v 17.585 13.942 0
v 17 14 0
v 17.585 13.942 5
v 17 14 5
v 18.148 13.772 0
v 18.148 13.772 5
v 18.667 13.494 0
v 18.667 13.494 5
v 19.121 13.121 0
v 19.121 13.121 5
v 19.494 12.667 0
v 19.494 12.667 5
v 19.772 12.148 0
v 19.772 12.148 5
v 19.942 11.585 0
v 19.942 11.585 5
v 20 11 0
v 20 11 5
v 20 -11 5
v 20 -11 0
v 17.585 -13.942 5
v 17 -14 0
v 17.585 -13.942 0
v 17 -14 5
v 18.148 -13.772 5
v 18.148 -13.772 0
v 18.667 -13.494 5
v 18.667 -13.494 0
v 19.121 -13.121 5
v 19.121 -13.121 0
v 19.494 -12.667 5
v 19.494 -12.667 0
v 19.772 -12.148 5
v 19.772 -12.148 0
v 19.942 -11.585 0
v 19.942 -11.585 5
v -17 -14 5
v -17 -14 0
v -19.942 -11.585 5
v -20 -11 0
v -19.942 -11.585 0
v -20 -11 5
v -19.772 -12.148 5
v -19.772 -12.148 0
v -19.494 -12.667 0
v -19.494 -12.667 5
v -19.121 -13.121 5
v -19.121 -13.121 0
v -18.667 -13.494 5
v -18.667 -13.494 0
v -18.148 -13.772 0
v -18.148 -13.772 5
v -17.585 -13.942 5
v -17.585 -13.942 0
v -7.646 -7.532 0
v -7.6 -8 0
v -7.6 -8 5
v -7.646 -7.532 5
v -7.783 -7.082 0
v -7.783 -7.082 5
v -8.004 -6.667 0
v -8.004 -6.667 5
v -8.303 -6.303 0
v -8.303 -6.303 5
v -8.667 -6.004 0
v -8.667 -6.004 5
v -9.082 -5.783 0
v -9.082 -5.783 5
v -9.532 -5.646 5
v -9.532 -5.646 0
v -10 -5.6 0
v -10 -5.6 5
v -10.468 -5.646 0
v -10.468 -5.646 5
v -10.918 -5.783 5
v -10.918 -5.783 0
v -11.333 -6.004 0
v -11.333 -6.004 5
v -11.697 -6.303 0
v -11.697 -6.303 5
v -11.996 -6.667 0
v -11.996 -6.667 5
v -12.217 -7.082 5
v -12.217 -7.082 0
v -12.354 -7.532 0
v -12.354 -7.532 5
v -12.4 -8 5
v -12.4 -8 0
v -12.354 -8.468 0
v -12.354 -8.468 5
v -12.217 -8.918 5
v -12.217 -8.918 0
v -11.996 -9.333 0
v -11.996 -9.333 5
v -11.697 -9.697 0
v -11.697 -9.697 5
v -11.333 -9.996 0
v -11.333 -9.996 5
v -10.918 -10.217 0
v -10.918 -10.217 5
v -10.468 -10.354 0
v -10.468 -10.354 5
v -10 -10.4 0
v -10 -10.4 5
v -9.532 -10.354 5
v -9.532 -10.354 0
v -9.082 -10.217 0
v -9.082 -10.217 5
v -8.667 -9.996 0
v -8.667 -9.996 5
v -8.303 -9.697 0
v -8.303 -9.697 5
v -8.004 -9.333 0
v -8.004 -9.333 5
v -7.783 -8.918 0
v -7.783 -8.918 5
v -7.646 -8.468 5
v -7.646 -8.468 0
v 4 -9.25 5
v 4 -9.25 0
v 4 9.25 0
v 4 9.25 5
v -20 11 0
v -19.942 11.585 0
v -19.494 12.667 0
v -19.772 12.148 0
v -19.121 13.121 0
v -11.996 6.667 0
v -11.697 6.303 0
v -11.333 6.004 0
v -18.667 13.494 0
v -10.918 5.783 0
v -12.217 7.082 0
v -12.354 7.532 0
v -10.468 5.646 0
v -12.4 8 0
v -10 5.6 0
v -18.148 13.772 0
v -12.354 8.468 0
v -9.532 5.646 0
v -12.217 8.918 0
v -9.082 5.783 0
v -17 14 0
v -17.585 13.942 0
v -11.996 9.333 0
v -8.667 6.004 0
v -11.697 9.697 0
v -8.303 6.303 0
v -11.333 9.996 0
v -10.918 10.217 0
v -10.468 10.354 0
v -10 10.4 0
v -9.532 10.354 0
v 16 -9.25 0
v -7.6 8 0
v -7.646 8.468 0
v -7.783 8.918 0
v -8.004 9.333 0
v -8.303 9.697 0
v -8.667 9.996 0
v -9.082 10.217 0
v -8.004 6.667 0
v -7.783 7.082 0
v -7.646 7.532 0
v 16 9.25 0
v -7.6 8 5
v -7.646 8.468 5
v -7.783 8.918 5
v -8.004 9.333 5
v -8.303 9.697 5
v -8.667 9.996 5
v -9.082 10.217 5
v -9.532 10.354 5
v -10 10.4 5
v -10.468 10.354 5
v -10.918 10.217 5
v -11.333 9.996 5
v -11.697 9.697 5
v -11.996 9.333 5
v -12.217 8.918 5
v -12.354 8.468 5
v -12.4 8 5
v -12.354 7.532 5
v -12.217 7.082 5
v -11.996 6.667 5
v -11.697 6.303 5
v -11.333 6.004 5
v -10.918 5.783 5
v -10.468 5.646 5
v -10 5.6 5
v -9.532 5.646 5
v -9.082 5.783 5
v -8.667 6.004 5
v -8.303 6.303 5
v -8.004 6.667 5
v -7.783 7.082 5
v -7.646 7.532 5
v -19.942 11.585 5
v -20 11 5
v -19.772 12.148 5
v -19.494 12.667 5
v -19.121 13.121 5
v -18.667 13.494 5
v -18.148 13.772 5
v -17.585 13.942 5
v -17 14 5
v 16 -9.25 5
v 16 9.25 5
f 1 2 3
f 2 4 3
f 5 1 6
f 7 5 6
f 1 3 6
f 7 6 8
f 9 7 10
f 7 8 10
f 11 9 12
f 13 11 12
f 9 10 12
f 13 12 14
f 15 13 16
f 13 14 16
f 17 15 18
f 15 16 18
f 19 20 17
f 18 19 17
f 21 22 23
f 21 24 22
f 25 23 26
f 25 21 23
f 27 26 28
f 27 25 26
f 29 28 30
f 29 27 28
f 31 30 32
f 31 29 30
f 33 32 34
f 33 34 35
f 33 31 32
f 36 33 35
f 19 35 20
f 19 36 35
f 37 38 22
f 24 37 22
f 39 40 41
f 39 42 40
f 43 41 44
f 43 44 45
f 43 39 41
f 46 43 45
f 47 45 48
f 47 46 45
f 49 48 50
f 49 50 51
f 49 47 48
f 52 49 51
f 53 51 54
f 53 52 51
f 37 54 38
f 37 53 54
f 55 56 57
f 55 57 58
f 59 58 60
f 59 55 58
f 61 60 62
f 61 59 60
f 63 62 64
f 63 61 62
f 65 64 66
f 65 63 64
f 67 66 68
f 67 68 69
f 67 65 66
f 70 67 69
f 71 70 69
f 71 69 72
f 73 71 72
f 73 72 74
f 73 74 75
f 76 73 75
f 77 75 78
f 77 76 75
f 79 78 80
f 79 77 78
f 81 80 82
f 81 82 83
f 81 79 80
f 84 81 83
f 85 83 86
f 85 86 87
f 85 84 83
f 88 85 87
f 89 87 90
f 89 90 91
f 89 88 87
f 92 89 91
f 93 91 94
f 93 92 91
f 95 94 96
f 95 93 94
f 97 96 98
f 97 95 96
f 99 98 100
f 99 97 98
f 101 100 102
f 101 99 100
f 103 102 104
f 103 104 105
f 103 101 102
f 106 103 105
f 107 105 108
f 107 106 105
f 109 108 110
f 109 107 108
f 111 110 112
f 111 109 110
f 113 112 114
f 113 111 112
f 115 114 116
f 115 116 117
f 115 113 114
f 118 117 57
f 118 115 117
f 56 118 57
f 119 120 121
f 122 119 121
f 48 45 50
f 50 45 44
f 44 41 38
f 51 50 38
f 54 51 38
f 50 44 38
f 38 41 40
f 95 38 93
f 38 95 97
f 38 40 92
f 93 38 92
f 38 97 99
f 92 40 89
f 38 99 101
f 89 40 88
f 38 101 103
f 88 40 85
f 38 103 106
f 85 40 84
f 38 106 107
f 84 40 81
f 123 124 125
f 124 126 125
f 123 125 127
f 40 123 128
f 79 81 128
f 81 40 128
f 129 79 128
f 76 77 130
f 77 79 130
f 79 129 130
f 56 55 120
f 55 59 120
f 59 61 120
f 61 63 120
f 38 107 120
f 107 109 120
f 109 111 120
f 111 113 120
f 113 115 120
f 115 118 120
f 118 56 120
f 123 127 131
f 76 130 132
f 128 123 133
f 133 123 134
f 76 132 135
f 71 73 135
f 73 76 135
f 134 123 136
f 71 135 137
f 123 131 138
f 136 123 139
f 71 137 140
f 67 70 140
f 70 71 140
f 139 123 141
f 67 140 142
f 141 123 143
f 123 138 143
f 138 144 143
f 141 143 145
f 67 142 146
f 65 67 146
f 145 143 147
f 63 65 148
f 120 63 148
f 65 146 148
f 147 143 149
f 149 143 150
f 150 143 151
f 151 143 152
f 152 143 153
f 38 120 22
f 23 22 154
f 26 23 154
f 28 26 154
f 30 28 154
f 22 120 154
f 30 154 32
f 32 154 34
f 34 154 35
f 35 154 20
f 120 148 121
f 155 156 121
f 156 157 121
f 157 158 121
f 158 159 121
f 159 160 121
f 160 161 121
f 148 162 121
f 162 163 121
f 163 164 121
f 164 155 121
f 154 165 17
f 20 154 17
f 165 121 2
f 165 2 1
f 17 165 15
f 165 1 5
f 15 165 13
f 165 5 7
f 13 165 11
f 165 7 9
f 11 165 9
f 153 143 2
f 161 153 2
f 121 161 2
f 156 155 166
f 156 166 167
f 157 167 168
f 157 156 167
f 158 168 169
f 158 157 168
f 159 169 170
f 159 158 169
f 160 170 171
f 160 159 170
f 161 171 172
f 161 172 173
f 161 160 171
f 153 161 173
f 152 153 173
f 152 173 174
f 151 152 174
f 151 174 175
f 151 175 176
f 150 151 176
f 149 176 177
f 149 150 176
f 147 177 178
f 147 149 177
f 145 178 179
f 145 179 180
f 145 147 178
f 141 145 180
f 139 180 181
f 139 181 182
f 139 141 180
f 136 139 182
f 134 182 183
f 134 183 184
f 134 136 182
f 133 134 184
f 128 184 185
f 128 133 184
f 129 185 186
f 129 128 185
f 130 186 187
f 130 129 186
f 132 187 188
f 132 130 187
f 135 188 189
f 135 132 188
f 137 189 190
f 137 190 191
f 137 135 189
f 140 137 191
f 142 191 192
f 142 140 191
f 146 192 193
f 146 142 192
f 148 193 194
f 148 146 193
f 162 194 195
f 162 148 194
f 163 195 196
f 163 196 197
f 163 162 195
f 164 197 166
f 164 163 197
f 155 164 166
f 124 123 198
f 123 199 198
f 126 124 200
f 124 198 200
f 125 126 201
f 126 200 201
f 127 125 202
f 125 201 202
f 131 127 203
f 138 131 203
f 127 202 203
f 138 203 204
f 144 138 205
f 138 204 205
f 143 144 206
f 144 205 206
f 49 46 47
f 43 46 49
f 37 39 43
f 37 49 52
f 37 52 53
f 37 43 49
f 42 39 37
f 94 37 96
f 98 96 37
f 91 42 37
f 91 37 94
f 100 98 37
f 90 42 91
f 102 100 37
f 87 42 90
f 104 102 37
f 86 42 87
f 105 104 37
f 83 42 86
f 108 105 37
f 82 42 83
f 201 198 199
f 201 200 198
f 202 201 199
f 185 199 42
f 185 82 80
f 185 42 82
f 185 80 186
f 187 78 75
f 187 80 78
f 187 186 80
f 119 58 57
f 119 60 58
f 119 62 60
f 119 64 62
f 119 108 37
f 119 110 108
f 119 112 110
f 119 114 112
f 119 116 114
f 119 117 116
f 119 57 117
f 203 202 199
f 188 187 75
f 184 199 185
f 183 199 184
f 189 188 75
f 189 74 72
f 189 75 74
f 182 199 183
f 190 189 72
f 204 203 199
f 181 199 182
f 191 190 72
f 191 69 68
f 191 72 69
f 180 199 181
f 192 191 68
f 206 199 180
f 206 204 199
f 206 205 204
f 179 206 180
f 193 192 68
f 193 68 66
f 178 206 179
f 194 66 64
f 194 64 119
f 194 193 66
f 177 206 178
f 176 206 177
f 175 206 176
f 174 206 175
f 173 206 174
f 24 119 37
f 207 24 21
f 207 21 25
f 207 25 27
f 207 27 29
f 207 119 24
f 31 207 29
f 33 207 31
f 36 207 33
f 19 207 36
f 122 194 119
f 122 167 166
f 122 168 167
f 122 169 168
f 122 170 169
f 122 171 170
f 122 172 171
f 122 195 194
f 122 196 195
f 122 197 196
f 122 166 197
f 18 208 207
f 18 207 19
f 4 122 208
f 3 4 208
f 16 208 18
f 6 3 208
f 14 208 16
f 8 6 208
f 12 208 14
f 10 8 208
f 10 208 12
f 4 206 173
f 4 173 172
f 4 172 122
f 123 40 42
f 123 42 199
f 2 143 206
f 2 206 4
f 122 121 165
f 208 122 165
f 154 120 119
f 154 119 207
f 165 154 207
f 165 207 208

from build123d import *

# Parameters (mm, degrees)
SKETCH1_W           = 40
SKETCH1_H           = 28
SKETCH1_R           = 2.4
SKETCH1_W_2         = 12
SKETCH1_H_2         = 18.5
BOSS_EXTRUDE1_DEPTH = 5
FILLET1_R           = 3


with BuildPart() as part:
    # Sketch1 → Boss-Extrude1 (new body)
    with BuildSketch(Plane.XY):
        Rectangle(SKETCH1_W, SKETCH1_H)
        with Locations((-10, 8)):
            Circle(SKETCH1_R, mode=Mode.SUBTRACT)
        with Locations((-10, -8)):
            Circle(SKETCH1_R, mode=Mode.SUBTRACT)
        with Locations((10, 0)):
            Rectangle(SKETCH1_W_2, SKETCH1_H_2, mode=Mode.SUBTRACT)
    extrude(amount=BOSS_EXTRUDE1_DEPTH)

    # Fillet1
    fillet1_edges = [part.edges().sort_by_distance(p)[0] for p in [
        (20, -14, 2.5),
        (-20, -14, 2.5),
        (-20, 14, 2.5),
        (20, 14, 2.5),
    ]]
    fillet(fillet1_edges, radius=FILLET1_R)


solid = part.part
